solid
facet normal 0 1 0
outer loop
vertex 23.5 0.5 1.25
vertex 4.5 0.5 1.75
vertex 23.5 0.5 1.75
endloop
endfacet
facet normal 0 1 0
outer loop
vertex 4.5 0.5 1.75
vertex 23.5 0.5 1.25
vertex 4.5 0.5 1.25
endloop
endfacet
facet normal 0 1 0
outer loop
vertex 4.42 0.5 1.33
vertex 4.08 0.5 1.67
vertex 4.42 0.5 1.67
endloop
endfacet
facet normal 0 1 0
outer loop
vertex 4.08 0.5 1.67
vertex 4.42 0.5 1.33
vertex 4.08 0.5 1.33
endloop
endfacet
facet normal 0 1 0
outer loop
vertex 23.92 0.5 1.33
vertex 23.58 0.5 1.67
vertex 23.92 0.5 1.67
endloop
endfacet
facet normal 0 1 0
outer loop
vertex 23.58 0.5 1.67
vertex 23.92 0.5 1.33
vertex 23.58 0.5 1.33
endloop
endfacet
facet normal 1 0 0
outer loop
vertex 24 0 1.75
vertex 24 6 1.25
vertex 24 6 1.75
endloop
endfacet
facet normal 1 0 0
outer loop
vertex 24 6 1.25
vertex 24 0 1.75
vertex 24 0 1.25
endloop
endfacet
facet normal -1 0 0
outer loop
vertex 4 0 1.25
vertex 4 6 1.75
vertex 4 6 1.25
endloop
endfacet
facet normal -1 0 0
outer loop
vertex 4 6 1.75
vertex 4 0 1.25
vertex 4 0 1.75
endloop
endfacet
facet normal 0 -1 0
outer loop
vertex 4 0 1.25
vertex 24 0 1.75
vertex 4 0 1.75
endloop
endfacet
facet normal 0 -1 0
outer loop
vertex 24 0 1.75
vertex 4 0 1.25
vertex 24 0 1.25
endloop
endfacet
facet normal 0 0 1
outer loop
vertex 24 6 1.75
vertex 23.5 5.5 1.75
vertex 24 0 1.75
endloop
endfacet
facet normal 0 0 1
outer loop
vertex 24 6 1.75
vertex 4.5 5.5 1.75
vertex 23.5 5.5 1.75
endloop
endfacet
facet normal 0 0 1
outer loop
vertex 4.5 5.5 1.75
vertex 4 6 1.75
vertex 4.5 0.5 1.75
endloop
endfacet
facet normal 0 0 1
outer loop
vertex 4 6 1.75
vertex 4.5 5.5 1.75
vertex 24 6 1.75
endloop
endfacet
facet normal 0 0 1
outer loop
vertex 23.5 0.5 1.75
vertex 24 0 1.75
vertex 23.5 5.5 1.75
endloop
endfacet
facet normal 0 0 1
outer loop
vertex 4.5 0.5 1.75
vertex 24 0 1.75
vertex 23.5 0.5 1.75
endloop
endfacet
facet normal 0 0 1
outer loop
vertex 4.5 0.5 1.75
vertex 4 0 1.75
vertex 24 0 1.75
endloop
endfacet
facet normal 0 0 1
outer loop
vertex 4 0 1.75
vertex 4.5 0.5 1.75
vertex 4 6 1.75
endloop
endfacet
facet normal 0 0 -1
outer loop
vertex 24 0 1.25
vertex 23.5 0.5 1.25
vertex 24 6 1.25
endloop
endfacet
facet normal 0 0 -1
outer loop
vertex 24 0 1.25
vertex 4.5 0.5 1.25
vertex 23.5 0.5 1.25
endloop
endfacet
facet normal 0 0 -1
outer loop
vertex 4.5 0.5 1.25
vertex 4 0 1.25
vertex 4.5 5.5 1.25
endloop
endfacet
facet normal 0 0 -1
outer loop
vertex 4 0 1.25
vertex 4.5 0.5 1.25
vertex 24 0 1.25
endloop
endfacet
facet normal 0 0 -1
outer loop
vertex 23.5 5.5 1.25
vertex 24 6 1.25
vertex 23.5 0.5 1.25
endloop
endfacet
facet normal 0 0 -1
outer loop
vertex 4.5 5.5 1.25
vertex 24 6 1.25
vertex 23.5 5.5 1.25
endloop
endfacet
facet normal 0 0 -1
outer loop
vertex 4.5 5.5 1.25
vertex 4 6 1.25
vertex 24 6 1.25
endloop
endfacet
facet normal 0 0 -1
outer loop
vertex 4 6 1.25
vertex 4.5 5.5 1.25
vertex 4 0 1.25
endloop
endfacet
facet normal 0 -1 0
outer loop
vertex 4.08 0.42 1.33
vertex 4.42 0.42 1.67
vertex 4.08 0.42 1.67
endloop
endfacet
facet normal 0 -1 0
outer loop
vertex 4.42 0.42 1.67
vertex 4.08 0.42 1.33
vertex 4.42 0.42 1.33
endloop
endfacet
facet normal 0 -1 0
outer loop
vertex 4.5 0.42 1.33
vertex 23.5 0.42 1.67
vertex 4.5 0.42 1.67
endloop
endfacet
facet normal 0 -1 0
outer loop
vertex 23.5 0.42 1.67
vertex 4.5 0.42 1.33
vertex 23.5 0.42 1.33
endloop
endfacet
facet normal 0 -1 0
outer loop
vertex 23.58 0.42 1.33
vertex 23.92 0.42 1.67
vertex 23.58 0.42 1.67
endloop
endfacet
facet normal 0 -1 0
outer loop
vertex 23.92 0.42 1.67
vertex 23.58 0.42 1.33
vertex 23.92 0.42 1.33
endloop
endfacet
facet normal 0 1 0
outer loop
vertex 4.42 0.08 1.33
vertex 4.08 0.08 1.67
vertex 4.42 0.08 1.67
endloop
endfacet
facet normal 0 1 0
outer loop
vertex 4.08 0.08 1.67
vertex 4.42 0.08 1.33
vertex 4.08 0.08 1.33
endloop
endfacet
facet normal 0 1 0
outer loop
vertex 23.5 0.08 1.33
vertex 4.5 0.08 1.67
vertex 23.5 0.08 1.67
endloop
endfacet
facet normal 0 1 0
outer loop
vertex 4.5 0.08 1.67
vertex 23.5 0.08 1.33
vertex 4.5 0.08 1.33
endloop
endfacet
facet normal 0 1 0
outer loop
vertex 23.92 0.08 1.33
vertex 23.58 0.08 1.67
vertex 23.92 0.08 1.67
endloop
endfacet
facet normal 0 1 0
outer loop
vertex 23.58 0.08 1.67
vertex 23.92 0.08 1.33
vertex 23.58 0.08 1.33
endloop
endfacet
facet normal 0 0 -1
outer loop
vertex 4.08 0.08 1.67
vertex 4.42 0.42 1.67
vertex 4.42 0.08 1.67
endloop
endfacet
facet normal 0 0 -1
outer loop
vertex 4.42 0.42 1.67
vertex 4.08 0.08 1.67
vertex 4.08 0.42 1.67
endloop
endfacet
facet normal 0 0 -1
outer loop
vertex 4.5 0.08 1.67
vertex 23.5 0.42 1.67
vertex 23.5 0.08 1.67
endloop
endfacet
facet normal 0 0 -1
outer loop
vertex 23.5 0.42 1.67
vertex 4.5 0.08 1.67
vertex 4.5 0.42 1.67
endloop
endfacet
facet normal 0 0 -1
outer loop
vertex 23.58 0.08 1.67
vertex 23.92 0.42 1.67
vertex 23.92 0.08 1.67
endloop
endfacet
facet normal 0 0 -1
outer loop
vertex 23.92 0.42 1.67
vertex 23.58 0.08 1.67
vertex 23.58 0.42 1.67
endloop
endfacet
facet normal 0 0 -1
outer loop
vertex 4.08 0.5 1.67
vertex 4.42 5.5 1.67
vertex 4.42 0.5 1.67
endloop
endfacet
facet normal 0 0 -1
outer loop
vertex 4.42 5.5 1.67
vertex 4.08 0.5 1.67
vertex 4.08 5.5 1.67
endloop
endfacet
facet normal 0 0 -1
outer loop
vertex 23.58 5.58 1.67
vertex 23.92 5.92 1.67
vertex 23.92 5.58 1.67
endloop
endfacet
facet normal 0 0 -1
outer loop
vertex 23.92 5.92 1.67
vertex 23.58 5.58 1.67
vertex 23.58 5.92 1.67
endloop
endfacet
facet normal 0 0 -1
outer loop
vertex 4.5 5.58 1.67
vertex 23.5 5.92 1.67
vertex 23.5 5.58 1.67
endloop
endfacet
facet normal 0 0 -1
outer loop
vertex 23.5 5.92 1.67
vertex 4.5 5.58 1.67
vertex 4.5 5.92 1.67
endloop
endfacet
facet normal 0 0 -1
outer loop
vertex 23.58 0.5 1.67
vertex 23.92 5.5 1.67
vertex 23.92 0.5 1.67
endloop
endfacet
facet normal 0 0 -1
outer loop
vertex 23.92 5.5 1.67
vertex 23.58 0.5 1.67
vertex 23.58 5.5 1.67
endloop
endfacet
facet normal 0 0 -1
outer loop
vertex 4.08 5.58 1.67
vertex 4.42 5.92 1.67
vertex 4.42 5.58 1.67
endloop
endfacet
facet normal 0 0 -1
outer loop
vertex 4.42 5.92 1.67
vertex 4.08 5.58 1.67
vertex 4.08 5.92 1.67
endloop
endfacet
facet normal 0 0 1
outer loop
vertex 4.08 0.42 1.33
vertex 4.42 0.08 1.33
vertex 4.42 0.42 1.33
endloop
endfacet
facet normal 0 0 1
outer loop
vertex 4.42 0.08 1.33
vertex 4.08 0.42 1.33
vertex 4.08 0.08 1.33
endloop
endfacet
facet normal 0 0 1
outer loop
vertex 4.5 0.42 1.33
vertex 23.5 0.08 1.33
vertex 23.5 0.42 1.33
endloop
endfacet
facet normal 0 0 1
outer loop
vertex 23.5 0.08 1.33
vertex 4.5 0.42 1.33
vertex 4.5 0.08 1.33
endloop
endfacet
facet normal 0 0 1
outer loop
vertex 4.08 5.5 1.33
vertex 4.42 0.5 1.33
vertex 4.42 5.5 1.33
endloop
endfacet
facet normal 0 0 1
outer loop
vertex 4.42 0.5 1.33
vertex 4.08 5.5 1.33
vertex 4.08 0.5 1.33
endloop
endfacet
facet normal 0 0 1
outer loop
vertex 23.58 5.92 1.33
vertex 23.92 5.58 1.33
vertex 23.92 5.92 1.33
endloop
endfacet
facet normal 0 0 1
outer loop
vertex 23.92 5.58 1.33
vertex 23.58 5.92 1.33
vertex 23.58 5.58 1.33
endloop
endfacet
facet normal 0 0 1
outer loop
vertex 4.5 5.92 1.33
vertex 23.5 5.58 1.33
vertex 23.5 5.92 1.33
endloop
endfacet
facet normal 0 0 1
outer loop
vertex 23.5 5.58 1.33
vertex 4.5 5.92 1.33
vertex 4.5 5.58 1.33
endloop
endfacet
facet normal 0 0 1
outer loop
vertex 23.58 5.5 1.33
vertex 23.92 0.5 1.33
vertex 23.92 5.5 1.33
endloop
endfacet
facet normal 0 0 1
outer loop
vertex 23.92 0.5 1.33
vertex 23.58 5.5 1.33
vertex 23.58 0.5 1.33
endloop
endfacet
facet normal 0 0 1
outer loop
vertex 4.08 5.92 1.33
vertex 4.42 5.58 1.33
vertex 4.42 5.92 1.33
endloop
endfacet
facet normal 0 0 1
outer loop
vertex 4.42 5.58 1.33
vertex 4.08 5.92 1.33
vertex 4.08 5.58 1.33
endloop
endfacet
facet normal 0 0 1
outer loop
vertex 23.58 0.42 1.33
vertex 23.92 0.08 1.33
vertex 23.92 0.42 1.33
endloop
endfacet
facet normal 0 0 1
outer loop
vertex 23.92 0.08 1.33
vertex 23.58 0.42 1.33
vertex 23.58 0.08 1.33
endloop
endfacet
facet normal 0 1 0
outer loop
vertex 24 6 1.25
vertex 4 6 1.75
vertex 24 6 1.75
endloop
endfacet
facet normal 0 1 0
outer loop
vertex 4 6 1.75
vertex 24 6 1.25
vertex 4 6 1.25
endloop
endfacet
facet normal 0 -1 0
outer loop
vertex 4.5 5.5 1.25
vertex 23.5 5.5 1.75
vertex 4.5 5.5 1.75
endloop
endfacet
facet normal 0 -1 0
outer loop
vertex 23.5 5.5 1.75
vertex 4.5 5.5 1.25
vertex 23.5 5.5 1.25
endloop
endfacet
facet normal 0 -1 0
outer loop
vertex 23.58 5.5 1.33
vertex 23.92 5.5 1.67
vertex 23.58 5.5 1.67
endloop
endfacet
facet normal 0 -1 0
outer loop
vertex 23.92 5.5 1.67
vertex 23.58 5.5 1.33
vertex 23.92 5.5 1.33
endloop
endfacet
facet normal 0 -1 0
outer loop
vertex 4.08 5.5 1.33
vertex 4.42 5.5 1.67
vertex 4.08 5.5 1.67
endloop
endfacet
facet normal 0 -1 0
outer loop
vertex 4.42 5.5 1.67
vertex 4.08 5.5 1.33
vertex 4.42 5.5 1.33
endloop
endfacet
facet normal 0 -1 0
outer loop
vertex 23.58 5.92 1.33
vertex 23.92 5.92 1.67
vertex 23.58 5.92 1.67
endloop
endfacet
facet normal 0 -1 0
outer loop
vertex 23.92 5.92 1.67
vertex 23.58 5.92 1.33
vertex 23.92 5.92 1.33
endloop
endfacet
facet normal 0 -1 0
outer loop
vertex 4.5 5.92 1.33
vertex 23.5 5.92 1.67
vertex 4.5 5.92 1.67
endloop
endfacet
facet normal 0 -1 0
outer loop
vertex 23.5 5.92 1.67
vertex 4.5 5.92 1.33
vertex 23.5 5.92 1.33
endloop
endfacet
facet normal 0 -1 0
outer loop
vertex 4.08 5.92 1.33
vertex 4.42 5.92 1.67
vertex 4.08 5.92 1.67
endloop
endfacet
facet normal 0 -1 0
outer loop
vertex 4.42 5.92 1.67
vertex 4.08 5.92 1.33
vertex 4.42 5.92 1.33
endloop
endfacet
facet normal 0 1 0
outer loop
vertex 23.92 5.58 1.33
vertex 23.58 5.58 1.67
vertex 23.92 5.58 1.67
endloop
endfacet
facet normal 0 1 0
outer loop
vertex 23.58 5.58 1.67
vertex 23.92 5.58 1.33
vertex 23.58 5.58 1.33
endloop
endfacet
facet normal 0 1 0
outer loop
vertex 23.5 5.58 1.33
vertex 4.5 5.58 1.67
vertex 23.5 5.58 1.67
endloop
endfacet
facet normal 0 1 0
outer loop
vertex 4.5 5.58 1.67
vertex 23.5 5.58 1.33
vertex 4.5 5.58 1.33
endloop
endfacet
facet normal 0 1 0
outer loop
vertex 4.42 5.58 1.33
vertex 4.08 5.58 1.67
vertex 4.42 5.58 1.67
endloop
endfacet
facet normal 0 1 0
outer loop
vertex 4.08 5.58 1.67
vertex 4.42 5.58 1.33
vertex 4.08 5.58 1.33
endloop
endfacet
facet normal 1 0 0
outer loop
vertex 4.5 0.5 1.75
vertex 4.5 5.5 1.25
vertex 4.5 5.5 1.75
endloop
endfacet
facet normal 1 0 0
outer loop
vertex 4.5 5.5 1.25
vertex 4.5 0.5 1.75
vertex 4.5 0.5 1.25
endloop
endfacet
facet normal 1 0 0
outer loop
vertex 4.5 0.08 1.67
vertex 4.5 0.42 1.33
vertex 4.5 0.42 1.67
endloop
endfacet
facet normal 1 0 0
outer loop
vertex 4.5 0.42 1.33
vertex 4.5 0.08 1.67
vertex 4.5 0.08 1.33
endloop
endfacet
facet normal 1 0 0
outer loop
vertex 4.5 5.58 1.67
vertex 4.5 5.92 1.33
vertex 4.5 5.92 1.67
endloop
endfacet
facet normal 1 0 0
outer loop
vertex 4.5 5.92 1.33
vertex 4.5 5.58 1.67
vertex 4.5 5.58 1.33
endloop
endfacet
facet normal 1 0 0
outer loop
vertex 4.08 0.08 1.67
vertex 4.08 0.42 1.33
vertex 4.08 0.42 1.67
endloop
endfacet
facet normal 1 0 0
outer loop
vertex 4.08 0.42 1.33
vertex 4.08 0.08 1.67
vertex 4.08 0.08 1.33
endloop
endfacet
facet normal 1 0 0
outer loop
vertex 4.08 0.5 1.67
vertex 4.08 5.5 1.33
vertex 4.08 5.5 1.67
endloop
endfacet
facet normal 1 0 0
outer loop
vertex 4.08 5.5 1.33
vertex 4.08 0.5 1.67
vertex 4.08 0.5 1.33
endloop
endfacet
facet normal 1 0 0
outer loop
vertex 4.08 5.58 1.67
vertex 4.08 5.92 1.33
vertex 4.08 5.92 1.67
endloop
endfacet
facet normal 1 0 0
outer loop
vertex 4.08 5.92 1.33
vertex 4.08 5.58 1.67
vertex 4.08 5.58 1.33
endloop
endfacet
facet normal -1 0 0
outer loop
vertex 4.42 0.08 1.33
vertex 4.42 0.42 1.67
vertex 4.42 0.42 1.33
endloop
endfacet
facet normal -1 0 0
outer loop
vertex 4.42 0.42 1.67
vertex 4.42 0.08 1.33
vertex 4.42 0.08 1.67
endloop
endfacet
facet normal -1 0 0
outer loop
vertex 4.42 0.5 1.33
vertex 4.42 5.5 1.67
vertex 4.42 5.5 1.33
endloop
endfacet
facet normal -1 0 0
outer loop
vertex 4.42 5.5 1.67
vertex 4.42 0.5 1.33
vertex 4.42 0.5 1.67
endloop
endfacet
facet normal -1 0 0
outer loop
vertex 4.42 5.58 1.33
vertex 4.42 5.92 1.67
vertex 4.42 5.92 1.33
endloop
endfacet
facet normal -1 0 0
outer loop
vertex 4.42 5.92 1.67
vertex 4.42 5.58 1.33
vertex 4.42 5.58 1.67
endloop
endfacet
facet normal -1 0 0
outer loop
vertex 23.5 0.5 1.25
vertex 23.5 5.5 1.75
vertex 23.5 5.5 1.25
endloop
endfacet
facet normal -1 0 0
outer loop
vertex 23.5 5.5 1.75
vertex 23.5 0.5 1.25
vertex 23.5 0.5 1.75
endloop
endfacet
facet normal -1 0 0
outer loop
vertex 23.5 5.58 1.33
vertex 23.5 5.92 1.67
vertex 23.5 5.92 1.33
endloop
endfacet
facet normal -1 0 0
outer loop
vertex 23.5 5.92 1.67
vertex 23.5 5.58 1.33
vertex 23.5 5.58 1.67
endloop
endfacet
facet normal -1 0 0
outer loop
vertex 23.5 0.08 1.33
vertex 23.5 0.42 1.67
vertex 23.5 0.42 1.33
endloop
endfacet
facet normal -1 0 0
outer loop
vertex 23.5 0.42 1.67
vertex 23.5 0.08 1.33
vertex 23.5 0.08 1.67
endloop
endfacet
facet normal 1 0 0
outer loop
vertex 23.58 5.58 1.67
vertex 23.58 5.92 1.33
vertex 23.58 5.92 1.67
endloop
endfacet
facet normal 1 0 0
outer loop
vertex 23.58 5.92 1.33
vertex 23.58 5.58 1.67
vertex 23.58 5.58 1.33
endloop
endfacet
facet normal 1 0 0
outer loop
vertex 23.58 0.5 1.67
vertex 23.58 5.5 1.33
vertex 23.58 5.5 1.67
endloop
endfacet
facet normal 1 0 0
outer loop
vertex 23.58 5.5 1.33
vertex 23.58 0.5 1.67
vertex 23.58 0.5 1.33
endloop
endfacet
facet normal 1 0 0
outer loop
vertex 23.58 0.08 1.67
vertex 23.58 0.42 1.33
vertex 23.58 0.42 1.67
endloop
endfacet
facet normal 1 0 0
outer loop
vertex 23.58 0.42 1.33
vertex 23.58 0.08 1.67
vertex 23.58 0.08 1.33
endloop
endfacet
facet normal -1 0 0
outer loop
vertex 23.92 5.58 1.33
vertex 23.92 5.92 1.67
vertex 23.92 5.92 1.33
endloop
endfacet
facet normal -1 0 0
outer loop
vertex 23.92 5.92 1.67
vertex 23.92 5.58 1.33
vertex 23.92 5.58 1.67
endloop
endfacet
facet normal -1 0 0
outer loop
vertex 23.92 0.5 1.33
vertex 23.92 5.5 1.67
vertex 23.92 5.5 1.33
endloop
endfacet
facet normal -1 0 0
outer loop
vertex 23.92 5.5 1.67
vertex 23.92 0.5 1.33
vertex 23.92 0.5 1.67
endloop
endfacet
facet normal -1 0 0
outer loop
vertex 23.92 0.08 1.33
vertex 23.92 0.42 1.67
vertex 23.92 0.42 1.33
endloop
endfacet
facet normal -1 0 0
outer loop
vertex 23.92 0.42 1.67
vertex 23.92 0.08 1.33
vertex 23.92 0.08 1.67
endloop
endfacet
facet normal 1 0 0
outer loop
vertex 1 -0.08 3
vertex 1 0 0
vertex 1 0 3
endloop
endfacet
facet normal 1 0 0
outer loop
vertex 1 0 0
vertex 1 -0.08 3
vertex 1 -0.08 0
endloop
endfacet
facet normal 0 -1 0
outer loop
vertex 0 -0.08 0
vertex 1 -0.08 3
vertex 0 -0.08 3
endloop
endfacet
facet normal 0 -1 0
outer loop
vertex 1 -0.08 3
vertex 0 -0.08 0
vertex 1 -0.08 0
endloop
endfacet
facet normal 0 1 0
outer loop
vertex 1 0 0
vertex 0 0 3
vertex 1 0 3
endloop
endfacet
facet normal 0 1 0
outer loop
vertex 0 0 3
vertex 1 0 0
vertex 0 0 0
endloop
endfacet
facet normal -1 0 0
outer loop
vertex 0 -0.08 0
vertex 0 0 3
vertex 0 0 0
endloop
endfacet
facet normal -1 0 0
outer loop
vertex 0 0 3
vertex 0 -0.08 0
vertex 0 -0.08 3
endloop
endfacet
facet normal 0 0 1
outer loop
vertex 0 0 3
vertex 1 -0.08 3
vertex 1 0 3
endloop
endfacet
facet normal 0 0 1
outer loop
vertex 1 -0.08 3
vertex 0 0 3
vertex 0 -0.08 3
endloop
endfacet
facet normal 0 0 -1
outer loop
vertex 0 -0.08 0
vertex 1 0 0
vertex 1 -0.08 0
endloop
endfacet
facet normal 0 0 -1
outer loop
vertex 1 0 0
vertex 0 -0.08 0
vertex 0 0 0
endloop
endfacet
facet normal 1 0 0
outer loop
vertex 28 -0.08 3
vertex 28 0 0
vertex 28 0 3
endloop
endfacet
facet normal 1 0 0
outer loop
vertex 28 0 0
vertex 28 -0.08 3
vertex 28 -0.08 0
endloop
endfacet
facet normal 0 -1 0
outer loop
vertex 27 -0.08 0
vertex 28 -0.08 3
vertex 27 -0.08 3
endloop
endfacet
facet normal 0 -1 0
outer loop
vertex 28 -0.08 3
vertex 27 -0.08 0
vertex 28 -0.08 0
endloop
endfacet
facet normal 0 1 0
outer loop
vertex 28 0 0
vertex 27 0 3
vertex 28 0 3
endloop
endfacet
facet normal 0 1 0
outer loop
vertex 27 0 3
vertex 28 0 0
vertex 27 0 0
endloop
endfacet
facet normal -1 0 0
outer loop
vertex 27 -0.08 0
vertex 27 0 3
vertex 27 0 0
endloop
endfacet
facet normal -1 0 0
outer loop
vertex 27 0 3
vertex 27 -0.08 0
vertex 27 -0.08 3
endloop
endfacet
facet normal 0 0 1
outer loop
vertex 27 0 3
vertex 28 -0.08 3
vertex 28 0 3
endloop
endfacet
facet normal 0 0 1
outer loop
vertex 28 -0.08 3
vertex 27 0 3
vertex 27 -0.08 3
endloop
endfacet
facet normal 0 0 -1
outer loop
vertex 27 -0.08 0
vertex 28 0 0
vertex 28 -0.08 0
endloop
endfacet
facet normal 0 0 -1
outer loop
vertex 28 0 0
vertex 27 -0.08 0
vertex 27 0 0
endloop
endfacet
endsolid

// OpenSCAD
// file: parts.scad
module rectangularTube(height, width, length, thickness) {
    difference()
    {
        cube([height, width, length]);
        // Ensure the inside sticks out a bit more to avoid clipping
        translate([thickness, thickness, -1]) {
            cube([height - 2*thickness, width - 2*thickness, length+2]);
        };
    }
};

module angleIron(height, width, length, thickness) {
    union()
    {
        cube([height, thickness, length]);
        rotate([0, -90, 0]) {
            translate([0, 0, -1 * thickness]) {
                cube([length, width, thickness]);
            }
        }
    }
}

module circularTube(outer, thickness, length) {
    outerRadius = outer / 2;
    innerRadius = outerRadius - thickness;
    difference() {
        cylinder(length, outerRadius, outerRadius, $fn=32);
        // Ensure the inside sticks out a bit more to avoid clipping
        translate([0, 0, -1]) {
            cylinder(length + 2, innerRadius, innerRadius, $fn=32);
        }
    }

}

module sheet(width, length, thickness) {
    cube([width, length, thickness]);
}

module circularBar(diameter, length) {
        cylinder(h=length, r1=diameter/2, r2=diameter/2, $fn=32);
}

module flatBar(thickness, width, length) {
    cube([width, length, thickness]);
}

module perforatedPlate(length, width, thickness, holeSize, holeSpacing) {
    radius = holeSize / 2;
    difference() {
        cube([length, width, thickness]);
        for( x = [ 0:holeSpacing:length ] ) {
            for ( y = [ 0:holeSpacing:width ]){
                translate([x, y, 0]){
                    cylinder( thickness*10 , radius, radius, $fn=32, center=true) ;
                }
            }
        }
    }
}


rectangularTube(4, 4, 12, .25);

translate([ 10, 0, 0]) {
    angleIron( 4, 4, 12, .25);
}

translate([ 22, 2, 0]) {
    circularTube(4, .25, 12);
}

translate([ 30, 0, 0]) {
    rotate([90, 0, 0]) {
        flatBar(.25, 4, 12);
    }
}

translate([ 40, 2, 0]) {
    circularBar(4, 12);
}

translate([ 50, 0, 0]) {
    rotate([270, 270, 0]) perforatedPlate(12, 6, .036, .067, .5);
}

translate([ 60, 0, 0]) {
    rotate([270, 270, 0]) sheet( 10, 10, .125 );
}
// main file
use <parts.scad>;


window_width = 26;
shelf_offset_from_window = 3;
shelf_width = window_width -  (2 * shelf_offset_from_window );
shelf_depth = 6;
bracket_width = 1;
bracket_length = 3;
square_tube_width = 0.5;



module wallBracket() {

  flatBar(.08, bracket_width, bracket_length);

}


module shelf() {

  rectangularTube(square_tube_width, square_tube_width,  shelf_width, .08);
  translate([shelf_depth - square_tube_width, 0, 0]) {
    rectangularTube(square_tube_width, square_tube_width,  shelf_width, .08);
  }
  translate([0, 0, square_tube_width]) {
    rotate([0, 90, 0]) rectangularTube(square_tube_width, square_tube_width,  shelf_depth, .08);
  }
  translate([0, 0, shelf_width]) {
    rotate([0, 90, 0]) rectangularTube(square_tube_width, square_tube_width,  shelf_depth, .08);
  }

}


rotate([ 90, 0, 0 ]) {


  wallBracket();

  translate([ shelf_offset_from_window + bracket_width, (bracket_length /2) - .5 * square_tube_width, 0]) {
    rotate([ 0, 90, 0] ){
      shelf();
    }
  }
  translate([ window_width + bracket_width , 0, 0 ]) {
    wallBracket();
  }

}
